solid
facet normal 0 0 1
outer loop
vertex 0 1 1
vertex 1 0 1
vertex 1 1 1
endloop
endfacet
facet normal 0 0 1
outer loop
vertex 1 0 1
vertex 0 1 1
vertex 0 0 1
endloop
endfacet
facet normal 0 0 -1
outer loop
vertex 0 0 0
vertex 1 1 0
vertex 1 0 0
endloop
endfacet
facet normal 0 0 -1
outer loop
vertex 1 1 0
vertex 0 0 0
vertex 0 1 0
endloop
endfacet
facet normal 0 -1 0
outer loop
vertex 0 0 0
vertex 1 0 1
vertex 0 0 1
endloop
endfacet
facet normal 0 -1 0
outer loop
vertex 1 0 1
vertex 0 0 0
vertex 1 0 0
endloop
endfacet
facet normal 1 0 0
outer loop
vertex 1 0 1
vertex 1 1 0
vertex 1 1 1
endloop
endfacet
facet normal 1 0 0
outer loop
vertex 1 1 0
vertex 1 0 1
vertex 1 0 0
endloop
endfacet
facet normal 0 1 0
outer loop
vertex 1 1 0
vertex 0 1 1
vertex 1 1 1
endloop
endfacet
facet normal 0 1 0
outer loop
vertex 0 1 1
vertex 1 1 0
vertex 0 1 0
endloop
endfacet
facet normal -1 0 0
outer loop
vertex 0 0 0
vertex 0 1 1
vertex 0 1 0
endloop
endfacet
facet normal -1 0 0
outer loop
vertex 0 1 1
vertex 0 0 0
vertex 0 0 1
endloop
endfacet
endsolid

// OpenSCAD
// file: ../params.scad
// FEEL greenfield V1 — millimetres/degrees. NOT recovered original CAD.
// All hardware fit values are UNMEASURED. See README before printing.
measurements_confirmed = false;
horn_fit_confirmed = false;
$fn = 48;
epsilon = 0.02;
columns = 7;
rows = 4;
pitch = 12;
row_y0 = -8;                  // New layout assumption: room for wrist-side servos.
body_w = 88.6;
body_l = 88.8;
body_h = 35;
corner_r = 9;
bottom_chamfer = 3;
finger_edge_r = 3;
wall = 2.5;
floor_h = 2.5;
face_t = 2.5;
dome_h = 3;
dome_radius = 43.5;           // Spherical cap footprint; corners remain flat.
strap_span = 101;
strap_w = 25;
strap_slot = 2.5;
second_strap = false;         // v7 prose said off, despite showing true in its table.
finger_scallops = false;
keep_lower_tab = false;
hole_d = 4.366;               // Nominal 11/64 inch FINISHED hole, not printer proof.
pin_d = 4.2;
pin_tip_r = 2.1;
pin_foot_tip_d = 0.6;
pin_cone_half_angle = 30;     // Assumption: 30 degrees from axis (60 included).
pin_collar_d = 6;
pin_collar_h = 0.5;
pin_collar_z = 6.7;           // From low pin foot; gives 4→2mm foam cavity.
rest_proud = -1.5;
stroke = 2;
band_angles = [0, 58, 117, 175];
gap_angles = [29, 87.5, 146];
tap_degrees = 21;
cam_base_r = 3.8;
cam_half_width = 24;
cam_exponents = [2.2, 2.5, 1.6]; // A / H (flatter crest) / G (lower flank slope).
cam_step = 1;                // Actual polygon resolution, also used by cam_sim.
cam_t = 3;
shaft_d = 3;
shaft_flat = 1.0;            // D flat plane X=+1mm, shaft radius 1.5mm.
shaft_length = 58;
shaft_origin_y = 38;
shaft_axis_z = 17.5;
bearing_clearance = 0.35;
bearing_y = [-13, 35];
bearing_t = 3;
guide_z = 26.7;
guide_t = 1.2;               // New thin-guide assumption; stiffness unverified.
screw_d = 3.3;
screw_pilot_d = 2.7;
screw_x = 40.5;
screw_y = [-14, -2, 10, 34];
foam_h = 5;                 // Two 3+2mm strips are a TEST; preload is unverified.
servo_case_w = 8.3;         // Overall manufacturer B; measure actual case.
servo_case_z = 20;          // Overall manufacturer A, oriented upright.
servo_case_depth = 13.3;    // UNMEASURED case alone; published C=17.3 includes shaft.
servo_face_y = -25;
servo_axis_from_top = 5;    // UNMEASURED
servo_tab_span = 26;        // UNMEASURED
servo_tab_t = 1.5;          // UNMEASURED
servo_tab_from_face = 1.5;  // UNMEASURED
servo_spline_d = 3.8;       // UNMEASURED — do not force a printed spline.
servo_spline_h = 2.5;       // UNMEASURED
servo_spline_teeth = 20;    // Manufacturer spec; tooth shape remains unmeasured.
fit_clearance = 0.3;
horn_hub_d = 4.7;           // UNMEASURED
horn_hub_h = 2.2;           // UNMEASURED
horn_arm_w = 3.2;           // UNMEASURED
horn_arm_t = 1.2;           // UNMEASURED
horn_hole_radius = 3.2;     // UNMEASURED
coupling_d = 10;
coupling_h = 7;
coupling_shaft_depth = 4;
pack_breadboard_w = 55;     // UNMEASURED 400-point board envelope.
pack_breadboard_l = 82;
pack_w = 68;
pack_l = 112;
pack_h = 13;
pack_floor = 3;
pack_adapter_w = 22;        // UNMEASURED
pack_adapter_l = 15;
pack_cap_d = 14;            // UNMEASURED

function col_x(c) = (c - (columns-1)/2)*pitch;
function row_y(r) = row_y0 + r*pitch;
function dome_R() = (dome_radius*dome_radius+dome_h*dome_h)/(2*dome_h);
function dome_at(x,y) = dome_h <= 0 || x*x+y*y >= dome_radius*dome_radius ? 0 :
    sqrt(dome_R()*dome_R()-x*x-y*y) - (dome_R()-dome_h);
function pin_length(c,r,domed=true) = body_h + rest_proud +
    (domed ? dome_at(col_x(c),row_y(r)) : 0) - (shaft_axis_z+cam_base_r);
function angular_distance(a,b) = abs(((a-b+540)%360)-180);
function cam_radius(theta,band,variant=0) = cam_base_r + stroke *
    max(0,1-pow(angular_distance(theta,90+band_angles[band])/cam_half_width,cam_exponents[variant]));
function cam_points(band,variant=0) = [for(a=[0:cam_step:360-cam_step])
    [cam_radius(a,band,variant)*cos(a),cam_radius(a,band,variant)*sin(a)]];
function screw_positions() = [for(x=[-screw_x,screw_x],y=screw_y) [x,y]];
// file: ../lib.scad
include <params.scad>

module rounded_rect(w,l,r) {
    assert(w>2*r && l>2*r);
    hull() for(x=[-w/2+r,w/2-r],y=[-l/2+r,l/2-r]) translate([x,y]) circle(r=r);
}
module rounded_box(w,l,h,r=3) { linear_extrude(h) rounded_rect(w,l,r); }
module bore_y(d,length) { rotate([90,0,0]) cylinder(d=d,h=length,center=true); }
module d_shaft(h,clearance=0) {
    intersection() {
        cylinder(d=shaft_d+clearance,h=h);
        translate([-shaft_d,-shaft_d,-epsilon]) cube([shaft_d+shaft_flat+clearance/2,2*shaft_d,h+2*epsilon]);
    }
}
module camshaft(variant=0) {
    assert(2*(cam_base_r+stroke)<pitch,"Adjacent nominal cam envelopes overlap");
    union() {
        cylinder(d=shaft_d,h=shaft_length-coupling_shaft_depth);
        translate([0,0,shaft_length-coupling_shaft_depth-epsilon]) d_shaft(coupling_shaft_depth+epsilon);
        for(r=[0:rows-1]) translate([0,0,shaft_origin_y-row_y(r)-cam_t/2])
            linear_extrude(cam_t) polygon(cam_points(r,variant));
    }
}
module shaft_in_place(c=0,angle=0,variant=0) {
    translate([col_x(c),shaft_origin_y,shaft_axis_z]) rotate([0,angle,0]) rotate([90,0,0]) camshaft(variant);
}
module pin(len=12.2,tip_r=pin_tip_r) {
    cone_h=(pin_d-pin_foot_tip_d)/2/tan(pin_cone_half_angle);
    assert(len>cone_h+tip_r+1);
    union() {
        cylinder(d1=pin_foot_tip_d,d2=pin_d,h=cone_h);
        translate([0,0,cone_h-epsilon]) cylinder(d=pin_d,h=len-tip_r-cone_h+epsilon-0.6);
        translate([0,0,len-tip_r-0.6-epsilon]) cylinder(d1=pin_d,d2=2*tip_r,h=0.6+2*epsilon);
        translate([0,0,len-tip_r]) intersection() {
            sphere(r=tip_r);
            translate([-tip_r,-tip_r,-epsilon]) cube([2*tip_r,2*tip_r,tip_r+epsilon]);
        }
        translate([0,0,pin_collar_z]) cylinder(d=pin_collar_d,h=pin_collar_h);
    }
}
module pin_plate(nc=7,tip_r=pin_tip_r,domed=true) {
    plate_w=(nc-1)*pitch+10;
    ymid=(row_y(0)+row_y(rows-1))/2;
    // Breakaway frame, runners and foot tabs keep every pin one connected mesh.
    difference() {
        translate([0,ymid,0]) rounded_box(plate_w,rows*pitch+6,1,2);
        translate([0,ymid,-epsilon]) rounded_box(plate_w-3,rows*pitch+3,1+2*epsilon,1);
    }
    for(c=[0:nc-1]) {
        x=(c-(nc-1)/2)*pitch;
        translate([x,row_y(rows-1)+8.2,0.85]) linear_extrude(0.45)
            text(nc==1?"TEST":str("C",c),size=1.5,halign="center",valign="center");
        translate([x+3.2,row_y(0)-8,0]) cube([1.4,(rows-1)*pitch+16,1]);
        for(r=[0:rows-1]) {
            translate([x,row_y(r),0]) pin(domed ? pin_length(c,r,true) : pin_length(3,r,false),tip_r);
            translate([x,row_y(r)-0.35,0.35]) cube([3.8,0.7,0.45]);
        }
    }
}
module lower_bearing(x,y) {
    difference() {
        translate([x-4.2,y-bearing_t/2,floor_h-epsilon]) cube([8.4,bearing_t,shaft_axis_z-floor_h+epsilon]);
        translate([x,y,shaft_axis_z]) bore_y(shaft_d+bearing_clearance,bearing_t+2*epsilon);
    }
}
module upper_bearing(x,y) {
    difference() {
        translate([x-4.2,y-bearing_t/2,shaft_axis_z]) cube([8.4,bearing_t,guide_z-shaft_axis_z+epsilon]);
        translate([x,y,shaft_axis_z]) bore_y(shaft_d+bearing_clearance,bearing_t+2*epsilon);
    }
}
module servo_nominal() {
    bottom=shaft_axis_z-(servo_case_z-servo_axis_from_top);
    translate([-servo_case_w/2,servo_face_y-servo_case_depth,bottom]) cube([servo_case_w,servo_case_depth,servo_case_z]);
    translate([-servo_case_w/2,servo_face_y-servo_tab_from_face-servo_tab_t,bottom+servo_case_z]) cube([servo_case_w,servo_tab_t,(servo_tab_span-servo_case_z)/2]);
    if(keep_lower_tab) translate([-servo_case_w/2,servo_face_y-servo_tab_from_face-servo_tab_t,bottom-(servo_tab_span-servo_case_z)/2]) cube([servo_case_w,servo_tab_t,(servo_tab_span-servo_case_z)/2]);
    translate([0,servo_face_y+servo_spline_h/2,shaft_axis_z]) bore_y(servo_spline_d,servo_spline_h+epsilon);
}
module coupling(kind=1) {
    clear=fit_clearance+(kind==2?0.2:0);
    difference() {
        cylinder(d=coupling_d,h=coupling_h);
        // Bed side mates to the D-shaft; top side captures a measured horn.
        translate([0,0,-epsilon]) d_shaft(coupling_shaft_depth+epsilon,clear);
        if(kind<3) {
            translate([0,0,coupling_h-horn_hub_h]) cylinder(d=horn_hub_d+clear,h=horn_hub_h+epsilon);
            translate([-coupling_d/2-epsilon,-(horn_arm_w+clear)/2,coupling_h-horn_arm_t]) cube([coupling_d+2*epsilon,horn_arm_w+clear,horn_arm_t+epsilon]);
            // Two tie holes hold a real horn arm; the supplied centre screw stays accessible.
            for(x=[-horn_hole_radius-0.4,horn_hole_radius+0.4]) translate([x,0,coupling_h-horn_hub_h-0.4]) cylinder(d=1.2,h=horn_hub_h+1);
        } else {
            // SIZING COUPON ONLY: smooth nominal bore, NOT a reproduced 20T spline.
            translate([0,0,coupling_h-servo_spline_h]) cylinder(d=servo_spline_d+clear,h=servo_spline_h+epsilon);
        }
        translate([0,0,-epsilon]) cylinder(d=1.6,h=coupling_h+2*epsilon);
    }
}
module foam_template(nc=7) {
    w=nc==1?9:(columns-1)*pitch+9;
    difference() {
        translate([0,(row_y(0)+row_y(rows-1))/2,0]) rounded_box(w,rows*pitch+1,1.2,1.5);
        for(c=[0:nc-1],r=[0:rows-1]) translate([(c-(nc-1)/2)*pitch,row_y(r),-epsilon]) cylinder(d=hole_d,h=1.2+2*epsilon);
        if(nc>1) for(c=[0:columns-2]) translate([col_x(c)+pitch/2-0.25,row_y(0)-3,0.6]) cube([0.5,(rows-1)*pitch+6,0.7]);
    }
}
// main file
include <../lib.scad>
function inside_rounded(x,y,w,l,r) = pow(max(abs(x)-(w/2-r),0),2)+pow(max(abs(y)-(l/2-r),0),2) <= r*r;
servo_bottom = shaft_axis_z-servo_case_z+servo_axis_from_top;
cone_h = (pin_d-pin_foot_tip_d)/2/tan(pin_cone_half_angle);
assert(servo_bottom>=floor_h-epsilon,"Nominal servo intersects floor");
assert(servo_bottom+servo_case_z<body_h-face_t,"Nominal servo intersects face");
for(c=[0:columns-1],sx=[-1,1],y=[servo_face_y-servo_case_depth,servo_face_y])
    assert(inside_rounded(col_x(c)+sx*servo_case_w/2,y,body_w-2*wall,body_l-2*wall,corner_r-wall),"Nominal servo envelope intersects inner side wall");
assert(shaft_axis_z+cam_base_r+stroke+cone_h<guide_z,"Raised pin cone enters straight guide");
assert(shaft_axis_z+cam_base_r+pin_collar_z>guide_z+guide_t,"Pin collar intersects lower guide");
assert(shaft_axis_z+cam_base_r+pin_collar_z+pin_collar_h+stroke<body_h-face_t,"Raised collar hits face underside");
assert(2*(cam_base_r+stroke)<pitch,"Nominal adjacent shaft cam envelopes overlap");
echo(["NOMINAL_FIT","passed", "actual servo/horn fit NOT VERIFIED"]);
echo(["PIN_CONE_CLEARANCE",guide_z-(shaft_axis_z+cam_base_r+stroke+cone_h)]);
echo(["PIN_FOAM_SPACES",body_h-face_t-(shaft_axis_z+cam_base_r+pin_collar_z+pin_collar_h),body_h-face_t-(shaft_axis_z+cam_base_r+pin_collar_z+pin_collar_h+stroke)]);
for(c=[0:columns-1],r=[0:rows-1]) echo(["PIN",c,r+1,col_x(c),row_y(r),pin_length(c,r),body_h+dome_at(col_x(c),row_y(r))+rest_proud+stroke]);
cube(1);
